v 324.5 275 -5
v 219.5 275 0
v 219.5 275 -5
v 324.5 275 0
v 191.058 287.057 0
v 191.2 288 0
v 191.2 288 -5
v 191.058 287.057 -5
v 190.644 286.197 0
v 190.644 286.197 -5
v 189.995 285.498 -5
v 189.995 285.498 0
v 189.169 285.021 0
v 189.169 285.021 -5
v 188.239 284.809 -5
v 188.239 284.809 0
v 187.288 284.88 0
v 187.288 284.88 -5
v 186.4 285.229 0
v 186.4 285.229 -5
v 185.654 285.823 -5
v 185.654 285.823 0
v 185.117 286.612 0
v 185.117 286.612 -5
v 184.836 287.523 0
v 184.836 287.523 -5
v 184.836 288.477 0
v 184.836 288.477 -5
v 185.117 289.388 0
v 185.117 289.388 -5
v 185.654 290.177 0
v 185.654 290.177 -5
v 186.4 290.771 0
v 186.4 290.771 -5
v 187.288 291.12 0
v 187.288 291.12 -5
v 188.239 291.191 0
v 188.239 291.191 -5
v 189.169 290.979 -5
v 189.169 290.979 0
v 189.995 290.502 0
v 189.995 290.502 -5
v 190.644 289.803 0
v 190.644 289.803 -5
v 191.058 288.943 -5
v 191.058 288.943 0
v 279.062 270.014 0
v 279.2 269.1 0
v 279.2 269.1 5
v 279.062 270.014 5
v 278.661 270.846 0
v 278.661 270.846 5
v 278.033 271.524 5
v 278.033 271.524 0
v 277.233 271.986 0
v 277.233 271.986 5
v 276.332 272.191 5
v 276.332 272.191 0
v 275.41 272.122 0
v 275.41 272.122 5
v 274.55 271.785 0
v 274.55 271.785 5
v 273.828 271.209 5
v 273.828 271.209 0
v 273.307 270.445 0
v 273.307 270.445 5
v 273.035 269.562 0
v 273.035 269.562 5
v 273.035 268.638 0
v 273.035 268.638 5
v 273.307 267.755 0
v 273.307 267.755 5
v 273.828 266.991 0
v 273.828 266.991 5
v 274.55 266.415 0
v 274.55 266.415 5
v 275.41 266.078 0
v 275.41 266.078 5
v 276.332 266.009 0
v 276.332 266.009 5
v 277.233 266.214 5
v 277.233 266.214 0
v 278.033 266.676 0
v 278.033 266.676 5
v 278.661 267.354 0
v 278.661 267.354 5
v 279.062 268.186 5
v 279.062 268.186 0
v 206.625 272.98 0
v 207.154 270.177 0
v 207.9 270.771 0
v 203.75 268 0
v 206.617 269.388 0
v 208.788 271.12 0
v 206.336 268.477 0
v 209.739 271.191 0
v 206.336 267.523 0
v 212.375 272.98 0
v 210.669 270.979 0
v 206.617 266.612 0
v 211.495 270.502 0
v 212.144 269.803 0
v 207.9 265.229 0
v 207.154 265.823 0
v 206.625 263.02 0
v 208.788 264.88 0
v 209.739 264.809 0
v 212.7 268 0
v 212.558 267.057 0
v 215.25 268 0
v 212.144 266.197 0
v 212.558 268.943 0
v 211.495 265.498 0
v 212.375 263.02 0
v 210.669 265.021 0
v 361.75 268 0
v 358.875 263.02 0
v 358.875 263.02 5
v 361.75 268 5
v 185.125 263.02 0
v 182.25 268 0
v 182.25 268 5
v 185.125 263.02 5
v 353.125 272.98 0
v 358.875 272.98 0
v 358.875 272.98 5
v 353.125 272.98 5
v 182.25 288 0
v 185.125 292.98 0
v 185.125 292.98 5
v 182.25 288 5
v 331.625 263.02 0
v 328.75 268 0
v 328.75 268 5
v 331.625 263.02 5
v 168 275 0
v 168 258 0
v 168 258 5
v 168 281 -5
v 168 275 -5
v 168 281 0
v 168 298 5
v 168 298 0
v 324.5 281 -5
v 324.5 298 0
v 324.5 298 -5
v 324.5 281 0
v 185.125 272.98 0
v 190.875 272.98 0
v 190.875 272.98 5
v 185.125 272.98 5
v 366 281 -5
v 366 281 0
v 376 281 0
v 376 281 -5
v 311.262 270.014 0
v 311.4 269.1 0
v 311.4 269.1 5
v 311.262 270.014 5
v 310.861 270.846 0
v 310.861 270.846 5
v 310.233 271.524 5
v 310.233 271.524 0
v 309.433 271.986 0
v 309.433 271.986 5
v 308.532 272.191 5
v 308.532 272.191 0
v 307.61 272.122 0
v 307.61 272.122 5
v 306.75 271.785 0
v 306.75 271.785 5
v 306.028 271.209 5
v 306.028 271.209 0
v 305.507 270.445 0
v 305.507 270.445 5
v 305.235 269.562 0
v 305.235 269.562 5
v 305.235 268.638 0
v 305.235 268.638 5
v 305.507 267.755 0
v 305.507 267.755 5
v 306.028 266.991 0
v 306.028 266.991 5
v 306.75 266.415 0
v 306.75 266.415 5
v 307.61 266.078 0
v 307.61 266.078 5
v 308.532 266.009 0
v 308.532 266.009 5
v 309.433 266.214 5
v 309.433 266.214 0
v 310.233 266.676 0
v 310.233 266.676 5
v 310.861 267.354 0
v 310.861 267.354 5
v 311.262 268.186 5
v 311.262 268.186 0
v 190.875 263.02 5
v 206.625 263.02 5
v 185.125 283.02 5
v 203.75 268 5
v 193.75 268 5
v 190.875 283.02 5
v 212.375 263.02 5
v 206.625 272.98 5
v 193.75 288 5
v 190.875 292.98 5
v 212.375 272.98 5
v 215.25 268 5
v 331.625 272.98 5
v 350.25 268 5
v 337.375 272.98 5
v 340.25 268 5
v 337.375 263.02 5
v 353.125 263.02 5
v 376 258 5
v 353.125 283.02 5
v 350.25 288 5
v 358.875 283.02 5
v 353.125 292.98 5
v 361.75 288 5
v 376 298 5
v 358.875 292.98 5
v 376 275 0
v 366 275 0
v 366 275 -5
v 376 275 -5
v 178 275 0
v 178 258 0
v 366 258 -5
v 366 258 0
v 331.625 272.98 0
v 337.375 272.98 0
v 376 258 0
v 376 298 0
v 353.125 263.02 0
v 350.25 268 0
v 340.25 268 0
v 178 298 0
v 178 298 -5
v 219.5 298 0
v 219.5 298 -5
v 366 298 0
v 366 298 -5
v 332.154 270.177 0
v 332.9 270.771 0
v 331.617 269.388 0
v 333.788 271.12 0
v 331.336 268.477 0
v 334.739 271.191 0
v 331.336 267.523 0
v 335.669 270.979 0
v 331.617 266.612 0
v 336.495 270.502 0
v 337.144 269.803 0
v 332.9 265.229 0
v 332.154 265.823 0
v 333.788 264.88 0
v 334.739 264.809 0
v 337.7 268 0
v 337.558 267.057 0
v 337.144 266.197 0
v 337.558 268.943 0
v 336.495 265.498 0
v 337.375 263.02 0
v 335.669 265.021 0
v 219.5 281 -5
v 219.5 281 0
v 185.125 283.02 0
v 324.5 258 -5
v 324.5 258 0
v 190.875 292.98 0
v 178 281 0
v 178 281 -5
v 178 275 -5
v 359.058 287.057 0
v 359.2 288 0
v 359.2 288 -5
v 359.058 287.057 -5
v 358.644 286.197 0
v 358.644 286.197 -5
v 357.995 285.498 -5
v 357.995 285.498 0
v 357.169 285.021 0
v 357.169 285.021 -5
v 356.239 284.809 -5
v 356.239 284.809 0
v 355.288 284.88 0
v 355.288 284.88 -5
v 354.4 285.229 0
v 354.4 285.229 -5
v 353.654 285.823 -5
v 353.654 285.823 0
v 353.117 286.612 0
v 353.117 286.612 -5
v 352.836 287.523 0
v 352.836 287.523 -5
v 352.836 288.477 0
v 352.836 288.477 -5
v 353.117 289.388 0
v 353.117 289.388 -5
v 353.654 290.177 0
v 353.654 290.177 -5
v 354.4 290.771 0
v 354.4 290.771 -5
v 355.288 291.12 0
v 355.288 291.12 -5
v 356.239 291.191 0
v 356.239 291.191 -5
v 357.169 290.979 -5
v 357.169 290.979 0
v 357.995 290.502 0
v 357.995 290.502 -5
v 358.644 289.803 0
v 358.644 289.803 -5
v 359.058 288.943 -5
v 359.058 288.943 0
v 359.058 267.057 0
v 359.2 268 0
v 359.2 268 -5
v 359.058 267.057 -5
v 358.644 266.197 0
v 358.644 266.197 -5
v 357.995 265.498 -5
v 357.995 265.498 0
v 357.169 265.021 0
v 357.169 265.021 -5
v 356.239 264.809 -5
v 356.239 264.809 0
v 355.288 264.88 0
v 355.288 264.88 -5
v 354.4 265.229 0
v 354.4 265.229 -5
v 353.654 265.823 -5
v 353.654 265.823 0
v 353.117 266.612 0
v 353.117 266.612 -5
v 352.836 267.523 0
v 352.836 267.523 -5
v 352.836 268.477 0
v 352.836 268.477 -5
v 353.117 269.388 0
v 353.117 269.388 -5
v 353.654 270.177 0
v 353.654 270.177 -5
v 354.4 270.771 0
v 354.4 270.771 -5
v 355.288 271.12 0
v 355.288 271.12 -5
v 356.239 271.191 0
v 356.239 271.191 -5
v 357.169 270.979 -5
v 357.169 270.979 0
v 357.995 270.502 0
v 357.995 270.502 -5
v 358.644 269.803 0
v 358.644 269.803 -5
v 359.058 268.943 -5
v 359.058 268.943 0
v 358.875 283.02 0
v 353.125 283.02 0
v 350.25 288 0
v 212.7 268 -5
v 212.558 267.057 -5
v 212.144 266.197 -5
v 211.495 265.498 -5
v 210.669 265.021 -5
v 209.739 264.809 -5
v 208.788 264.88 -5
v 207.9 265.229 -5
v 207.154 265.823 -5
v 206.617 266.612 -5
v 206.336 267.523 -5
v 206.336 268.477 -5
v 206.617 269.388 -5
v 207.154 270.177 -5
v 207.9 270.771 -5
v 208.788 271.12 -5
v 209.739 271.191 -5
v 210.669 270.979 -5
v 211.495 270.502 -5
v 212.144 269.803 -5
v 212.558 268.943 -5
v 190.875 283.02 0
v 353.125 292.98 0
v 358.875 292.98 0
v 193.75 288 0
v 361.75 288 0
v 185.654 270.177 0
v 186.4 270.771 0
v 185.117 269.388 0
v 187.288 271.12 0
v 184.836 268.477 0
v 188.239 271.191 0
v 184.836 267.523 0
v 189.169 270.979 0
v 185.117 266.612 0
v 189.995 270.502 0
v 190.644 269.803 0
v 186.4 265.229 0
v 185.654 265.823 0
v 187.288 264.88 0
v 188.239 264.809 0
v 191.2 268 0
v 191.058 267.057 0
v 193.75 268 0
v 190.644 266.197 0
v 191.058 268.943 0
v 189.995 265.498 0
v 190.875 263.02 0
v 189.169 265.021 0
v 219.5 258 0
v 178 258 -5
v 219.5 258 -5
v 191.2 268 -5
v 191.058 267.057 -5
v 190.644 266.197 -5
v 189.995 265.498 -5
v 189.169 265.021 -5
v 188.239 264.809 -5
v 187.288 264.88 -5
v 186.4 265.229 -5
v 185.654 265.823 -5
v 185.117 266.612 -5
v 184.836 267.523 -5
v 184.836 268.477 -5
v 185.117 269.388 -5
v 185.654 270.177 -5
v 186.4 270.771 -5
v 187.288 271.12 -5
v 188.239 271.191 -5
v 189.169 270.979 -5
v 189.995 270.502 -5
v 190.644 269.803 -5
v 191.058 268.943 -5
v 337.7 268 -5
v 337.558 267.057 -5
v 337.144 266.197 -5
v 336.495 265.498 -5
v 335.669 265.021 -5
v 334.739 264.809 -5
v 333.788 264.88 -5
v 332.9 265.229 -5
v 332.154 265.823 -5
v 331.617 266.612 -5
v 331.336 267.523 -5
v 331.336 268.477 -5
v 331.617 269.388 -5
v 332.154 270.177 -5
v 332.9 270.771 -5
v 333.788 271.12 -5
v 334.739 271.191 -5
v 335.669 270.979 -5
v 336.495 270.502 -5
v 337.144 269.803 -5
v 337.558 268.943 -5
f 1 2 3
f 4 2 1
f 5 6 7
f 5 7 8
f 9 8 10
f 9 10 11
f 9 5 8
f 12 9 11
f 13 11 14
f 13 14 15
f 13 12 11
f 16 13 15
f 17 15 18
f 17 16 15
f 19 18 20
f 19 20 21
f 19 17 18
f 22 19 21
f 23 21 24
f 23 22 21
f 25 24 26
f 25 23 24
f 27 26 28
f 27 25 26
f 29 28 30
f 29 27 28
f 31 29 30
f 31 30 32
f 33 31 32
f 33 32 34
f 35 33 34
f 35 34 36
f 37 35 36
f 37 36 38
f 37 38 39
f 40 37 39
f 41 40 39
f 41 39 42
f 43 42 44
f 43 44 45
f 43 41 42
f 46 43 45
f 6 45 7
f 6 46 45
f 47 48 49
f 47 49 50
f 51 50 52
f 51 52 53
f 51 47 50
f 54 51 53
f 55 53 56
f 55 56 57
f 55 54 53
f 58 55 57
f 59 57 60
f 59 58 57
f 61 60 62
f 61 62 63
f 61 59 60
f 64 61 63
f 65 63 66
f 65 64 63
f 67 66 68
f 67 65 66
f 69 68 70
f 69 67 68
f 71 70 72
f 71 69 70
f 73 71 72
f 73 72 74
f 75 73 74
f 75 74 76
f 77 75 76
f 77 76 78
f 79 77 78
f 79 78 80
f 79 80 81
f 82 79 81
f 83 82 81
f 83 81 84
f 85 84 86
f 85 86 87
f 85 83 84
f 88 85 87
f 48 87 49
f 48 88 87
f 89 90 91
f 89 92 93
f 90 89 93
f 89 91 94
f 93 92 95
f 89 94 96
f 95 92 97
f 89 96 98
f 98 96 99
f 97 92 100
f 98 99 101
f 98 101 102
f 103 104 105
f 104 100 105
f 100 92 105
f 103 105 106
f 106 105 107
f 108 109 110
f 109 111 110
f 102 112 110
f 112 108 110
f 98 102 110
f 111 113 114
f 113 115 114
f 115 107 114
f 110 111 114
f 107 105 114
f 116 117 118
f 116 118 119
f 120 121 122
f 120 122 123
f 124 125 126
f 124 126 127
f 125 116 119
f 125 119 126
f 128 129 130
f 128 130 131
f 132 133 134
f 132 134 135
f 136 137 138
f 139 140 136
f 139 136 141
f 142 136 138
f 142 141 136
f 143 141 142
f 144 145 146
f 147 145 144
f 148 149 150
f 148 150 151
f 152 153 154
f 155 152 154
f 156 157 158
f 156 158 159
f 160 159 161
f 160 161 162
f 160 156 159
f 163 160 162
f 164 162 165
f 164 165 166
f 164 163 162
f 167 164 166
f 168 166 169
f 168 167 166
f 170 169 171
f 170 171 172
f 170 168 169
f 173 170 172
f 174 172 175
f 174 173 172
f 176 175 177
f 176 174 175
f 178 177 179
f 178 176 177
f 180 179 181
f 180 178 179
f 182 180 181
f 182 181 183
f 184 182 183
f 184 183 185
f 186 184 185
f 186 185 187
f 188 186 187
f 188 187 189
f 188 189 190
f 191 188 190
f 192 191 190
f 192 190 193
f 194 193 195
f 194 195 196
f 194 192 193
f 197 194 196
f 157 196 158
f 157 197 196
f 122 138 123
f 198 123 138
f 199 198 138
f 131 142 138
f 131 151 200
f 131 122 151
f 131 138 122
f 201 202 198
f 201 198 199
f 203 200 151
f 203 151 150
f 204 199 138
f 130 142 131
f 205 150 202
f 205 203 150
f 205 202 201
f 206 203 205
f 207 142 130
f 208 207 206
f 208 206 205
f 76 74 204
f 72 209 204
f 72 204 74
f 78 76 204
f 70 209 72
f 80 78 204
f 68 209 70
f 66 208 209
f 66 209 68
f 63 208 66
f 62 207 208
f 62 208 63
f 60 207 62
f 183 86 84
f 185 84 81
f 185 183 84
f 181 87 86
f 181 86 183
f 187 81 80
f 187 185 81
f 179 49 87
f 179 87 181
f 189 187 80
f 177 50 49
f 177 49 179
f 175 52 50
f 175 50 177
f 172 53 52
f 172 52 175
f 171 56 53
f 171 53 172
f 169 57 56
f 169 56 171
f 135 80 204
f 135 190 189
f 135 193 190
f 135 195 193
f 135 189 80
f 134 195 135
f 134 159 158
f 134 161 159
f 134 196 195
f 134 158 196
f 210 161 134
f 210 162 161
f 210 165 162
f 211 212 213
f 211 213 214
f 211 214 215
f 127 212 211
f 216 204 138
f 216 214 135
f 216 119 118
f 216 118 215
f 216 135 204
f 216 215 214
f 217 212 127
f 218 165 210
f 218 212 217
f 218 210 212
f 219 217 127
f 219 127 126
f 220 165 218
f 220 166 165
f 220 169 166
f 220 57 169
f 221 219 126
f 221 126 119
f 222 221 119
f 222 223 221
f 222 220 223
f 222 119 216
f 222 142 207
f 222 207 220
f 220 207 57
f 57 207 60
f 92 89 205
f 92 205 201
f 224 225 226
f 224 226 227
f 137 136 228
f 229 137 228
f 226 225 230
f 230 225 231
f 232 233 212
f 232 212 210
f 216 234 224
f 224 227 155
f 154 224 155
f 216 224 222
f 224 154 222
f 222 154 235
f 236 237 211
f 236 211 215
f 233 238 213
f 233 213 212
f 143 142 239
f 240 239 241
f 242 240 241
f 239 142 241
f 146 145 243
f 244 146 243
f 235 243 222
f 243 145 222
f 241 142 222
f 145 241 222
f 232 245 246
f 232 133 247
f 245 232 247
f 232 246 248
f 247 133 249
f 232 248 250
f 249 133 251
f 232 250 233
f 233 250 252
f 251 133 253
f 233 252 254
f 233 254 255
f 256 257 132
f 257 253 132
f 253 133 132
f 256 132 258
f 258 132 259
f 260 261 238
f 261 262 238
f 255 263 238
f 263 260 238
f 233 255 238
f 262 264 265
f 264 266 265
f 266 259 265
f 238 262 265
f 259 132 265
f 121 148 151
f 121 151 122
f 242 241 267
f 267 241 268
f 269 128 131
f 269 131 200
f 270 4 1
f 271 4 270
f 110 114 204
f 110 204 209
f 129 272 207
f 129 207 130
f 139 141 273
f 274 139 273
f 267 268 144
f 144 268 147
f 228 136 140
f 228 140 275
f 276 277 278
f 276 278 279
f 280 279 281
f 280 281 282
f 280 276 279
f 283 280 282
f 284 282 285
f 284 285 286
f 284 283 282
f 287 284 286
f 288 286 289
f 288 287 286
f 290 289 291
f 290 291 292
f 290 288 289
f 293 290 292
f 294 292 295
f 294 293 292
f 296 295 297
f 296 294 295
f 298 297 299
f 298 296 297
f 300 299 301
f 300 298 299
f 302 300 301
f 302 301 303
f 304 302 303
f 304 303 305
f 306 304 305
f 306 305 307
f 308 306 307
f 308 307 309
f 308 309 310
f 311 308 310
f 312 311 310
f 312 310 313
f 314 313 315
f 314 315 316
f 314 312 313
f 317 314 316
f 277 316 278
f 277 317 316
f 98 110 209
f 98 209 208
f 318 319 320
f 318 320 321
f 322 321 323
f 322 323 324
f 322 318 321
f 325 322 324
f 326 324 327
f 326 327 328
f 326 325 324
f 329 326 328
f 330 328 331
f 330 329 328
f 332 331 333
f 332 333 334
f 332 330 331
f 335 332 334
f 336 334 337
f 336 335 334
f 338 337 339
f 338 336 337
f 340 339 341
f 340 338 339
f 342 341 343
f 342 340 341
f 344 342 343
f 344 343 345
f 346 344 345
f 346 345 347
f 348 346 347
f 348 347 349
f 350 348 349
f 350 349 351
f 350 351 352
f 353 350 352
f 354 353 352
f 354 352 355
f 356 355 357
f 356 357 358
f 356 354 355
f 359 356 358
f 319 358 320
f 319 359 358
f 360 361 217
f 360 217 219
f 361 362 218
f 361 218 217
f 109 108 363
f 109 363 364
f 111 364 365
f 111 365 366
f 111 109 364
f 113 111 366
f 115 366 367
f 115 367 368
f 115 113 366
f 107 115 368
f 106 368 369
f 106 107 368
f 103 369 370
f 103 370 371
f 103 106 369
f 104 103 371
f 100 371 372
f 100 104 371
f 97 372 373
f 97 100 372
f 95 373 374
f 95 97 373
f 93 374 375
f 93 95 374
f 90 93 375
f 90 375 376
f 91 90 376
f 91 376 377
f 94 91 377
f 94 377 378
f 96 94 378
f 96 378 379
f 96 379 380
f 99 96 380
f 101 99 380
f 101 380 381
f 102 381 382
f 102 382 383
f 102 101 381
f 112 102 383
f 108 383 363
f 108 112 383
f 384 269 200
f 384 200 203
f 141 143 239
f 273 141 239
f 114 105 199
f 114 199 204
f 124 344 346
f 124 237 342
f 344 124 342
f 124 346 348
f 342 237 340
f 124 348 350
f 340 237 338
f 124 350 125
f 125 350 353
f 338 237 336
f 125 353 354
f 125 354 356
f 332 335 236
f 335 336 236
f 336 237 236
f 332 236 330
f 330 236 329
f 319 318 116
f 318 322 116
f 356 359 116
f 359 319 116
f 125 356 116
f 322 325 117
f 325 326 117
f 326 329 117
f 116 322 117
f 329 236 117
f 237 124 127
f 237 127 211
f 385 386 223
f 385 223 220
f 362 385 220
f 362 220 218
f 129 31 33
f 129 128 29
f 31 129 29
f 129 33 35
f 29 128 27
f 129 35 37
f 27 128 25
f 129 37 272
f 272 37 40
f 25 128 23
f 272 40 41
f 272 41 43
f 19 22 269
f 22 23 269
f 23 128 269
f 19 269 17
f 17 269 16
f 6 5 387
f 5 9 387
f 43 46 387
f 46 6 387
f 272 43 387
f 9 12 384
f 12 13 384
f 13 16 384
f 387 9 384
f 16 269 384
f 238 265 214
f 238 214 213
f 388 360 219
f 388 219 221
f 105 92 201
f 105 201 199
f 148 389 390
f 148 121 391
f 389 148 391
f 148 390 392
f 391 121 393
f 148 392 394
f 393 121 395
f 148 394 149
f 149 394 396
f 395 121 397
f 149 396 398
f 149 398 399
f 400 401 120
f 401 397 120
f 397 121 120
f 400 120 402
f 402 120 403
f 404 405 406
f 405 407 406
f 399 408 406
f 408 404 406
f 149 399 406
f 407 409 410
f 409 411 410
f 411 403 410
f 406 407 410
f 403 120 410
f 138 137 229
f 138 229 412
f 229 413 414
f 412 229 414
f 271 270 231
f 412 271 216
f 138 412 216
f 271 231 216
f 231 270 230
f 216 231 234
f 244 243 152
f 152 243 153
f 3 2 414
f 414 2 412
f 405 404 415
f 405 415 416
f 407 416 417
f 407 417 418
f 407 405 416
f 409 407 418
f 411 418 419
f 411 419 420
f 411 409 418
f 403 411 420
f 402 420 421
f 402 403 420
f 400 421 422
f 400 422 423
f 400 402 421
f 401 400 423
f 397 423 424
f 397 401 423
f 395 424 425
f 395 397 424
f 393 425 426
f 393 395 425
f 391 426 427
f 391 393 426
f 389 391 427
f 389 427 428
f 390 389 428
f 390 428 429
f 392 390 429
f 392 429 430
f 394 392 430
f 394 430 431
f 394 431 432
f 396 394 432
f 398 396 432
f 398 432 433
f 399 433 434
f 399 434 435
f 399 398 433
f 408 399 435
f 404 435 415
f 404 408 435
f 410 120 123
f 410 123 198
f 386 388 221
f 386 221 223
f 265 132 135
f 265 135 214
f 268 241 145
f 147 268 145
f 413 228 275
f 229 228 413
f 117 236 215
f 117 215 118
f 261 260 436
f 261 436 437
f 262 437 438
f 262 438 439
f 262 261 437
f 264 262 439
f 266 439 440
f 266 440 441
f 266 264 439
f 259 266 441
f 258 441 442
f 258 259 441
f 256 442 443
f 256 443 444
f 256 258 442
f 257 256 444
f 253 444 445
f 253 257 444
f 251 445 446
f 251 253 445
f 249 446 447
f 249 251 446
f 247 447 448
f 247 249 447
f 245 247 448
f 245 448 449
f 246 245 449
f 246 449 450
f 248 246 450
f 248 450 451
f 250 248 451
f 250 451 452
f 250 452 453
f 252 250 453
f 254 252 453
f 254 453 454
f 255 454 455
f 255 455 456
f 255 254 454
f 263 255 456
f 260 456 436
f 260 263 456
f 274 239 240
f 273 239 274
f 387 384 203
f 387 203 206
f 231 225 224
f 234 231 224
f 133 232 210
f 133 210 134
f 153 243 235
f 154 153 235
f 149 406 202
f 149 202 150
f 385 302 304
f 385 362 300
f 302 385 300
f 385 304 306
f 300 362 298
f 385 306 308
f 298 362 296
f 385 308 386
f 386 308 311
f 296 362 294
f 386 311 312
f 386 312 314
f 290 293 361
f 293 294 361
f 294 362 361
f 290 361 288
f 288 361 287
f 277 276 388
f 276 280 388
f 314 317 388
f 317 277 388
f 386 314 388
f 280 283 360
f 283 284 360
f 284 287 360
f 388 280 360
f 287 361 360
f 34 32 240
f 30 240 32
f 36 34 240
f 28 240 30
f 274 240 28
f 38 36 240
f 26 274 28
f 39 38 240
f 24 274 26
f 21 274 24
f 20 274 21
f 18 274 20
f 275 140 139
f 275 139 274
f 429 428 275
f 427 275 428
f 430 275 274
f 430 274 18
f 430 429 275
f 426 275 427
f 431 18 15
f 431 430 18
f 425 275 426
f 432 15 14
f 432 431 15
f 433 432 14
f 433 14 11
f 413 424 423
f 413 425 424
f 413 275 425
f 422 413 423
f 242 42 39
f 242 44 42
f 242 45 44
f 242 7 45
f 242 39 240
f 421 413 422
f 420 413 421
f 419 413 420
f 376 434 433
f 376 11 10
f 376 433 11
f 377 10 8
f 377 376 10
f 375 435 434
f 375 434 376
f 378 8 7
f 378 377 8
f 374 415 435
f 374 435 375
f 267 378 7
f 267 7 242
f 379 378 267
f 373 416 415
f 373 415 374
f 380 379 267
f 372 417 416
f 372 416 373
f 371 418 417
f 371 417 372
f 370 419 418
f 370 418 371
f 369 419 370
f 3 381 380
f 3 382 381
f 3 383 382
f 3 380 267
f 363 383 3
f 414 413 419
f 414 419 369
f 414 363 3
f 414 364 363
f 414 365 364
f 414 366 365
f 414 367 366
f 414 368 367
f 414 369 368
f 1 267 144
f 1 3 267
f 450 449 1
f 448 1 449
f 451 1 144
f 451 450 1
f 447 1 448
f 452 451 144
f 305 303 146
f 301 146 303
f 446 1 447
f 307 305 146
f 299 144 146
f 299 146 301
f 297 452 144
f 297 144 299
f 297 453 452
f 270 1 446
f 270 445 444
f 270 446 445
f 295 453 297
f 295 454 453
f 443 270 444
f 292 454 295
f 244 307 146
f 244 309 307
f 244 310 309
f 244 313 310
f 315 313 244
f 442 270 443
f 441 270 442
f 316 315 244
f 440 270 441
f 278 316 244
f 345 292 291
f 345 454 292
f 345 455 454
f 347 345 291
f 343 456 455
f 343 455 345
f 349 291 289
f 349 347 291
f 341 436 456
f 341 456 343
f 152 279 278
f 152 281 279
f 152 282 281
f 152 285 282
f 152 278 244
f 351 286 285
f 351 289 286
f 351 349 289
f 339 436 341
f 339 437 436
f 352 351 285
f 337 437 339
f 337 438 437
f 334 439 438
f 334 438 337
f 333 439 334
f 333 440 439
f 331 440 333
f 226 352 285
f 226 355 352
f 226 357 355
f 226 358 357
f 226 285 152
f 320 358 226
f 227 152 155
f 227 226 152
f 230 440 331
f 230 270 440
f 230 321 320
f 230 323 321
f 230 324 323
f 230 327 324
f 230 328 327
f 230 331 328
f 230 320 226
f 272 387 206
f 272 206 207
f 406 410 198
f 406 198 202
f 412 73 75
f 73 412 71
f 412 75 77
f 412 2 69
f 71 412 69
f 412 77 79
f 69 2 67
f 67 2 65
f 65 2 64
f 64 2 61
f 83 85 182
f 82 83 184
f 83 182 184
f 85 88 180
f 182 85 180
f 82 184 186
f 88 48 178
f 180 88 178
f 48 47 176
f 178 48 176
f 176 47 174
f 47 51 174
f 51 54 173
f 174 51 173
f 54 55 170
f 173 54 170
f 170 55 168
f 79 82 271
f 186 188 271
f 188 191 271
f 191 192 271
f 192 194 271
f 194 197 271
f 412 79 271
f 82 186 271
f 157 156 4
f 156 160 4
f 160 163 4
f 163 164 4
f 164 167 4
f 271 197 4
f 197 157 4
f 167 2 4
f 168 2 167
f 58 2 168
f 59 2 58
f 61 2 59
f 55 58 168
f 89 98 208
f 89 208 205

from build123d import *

# Parameters (mm, degrees)
SKETCH005_W  = 208
SKETCH005_H  = 40
SKETCH005_R  = 3.1
PAD005_DEPTH = 5
SKETCH006_W  = 208
SKETCH006_H  = 6
PAD006_DEPTH = 5
SKETCH007_W  = 41.5
SKETCH007_H  = 40
SKETCH007_R  = 3.2
PAD007_DEPTH = 5


with BuildPart() as part:
    # Sketch005 → Pad005 (new body)
    with BuildSketch(Plane.XY):
        with Locations((4, 0)):
            Rectangle(SKETCH005_W, SKETCH005_H)
        with Locations((8.1, -8.9)):
            Circle(SKETCH005_R, mode=Mode.SUBTRACT)
        with Locations((40.3, -8.9)):
            Circle(SKETCH005_R, mode=Mode.SUBTRACT)
        Polygon((93.75, 10), (90.875, 14.979646), (85.125, 14.979646), (82.25, 10), (85.125, 5.020354), (90.875, 5.020354), align=None, mode=Mode.SUBTRACT)
        Polygon((93.75, -10), (90.875, -5.020354), (85.125, -5.020354), (82.25, -10), (85.125, -14.979646), (90.875, -14.979646), align=None, mode=Mode.SUBTRACT)
        Polygon((-74.25, 10), (-77.125, 14.979646), (-82.875, 14.979646), (-85.75, 10), (-82.875, 5.020354), (-77.125, 5.020354), align=None, mode=Mode.SUBTRACT)
        Polygon((-74.25, -10), (-77.125, -5.020354), (-82.875, -5.020354), (-85.75, -10), (-82.875, -14.979646), (-77.125, -14.979646), align=None, mode=Mode.SUBTRACT)
        Polygon((-52.75, -10), (-55.625, -5.020354), (-61.375, -5.020354), (-64.25, -10), (-61.375, -14.979646), (-55.625, -14.979646), align=None, mode=Mode.SUBTRACT)
        Polygon((72.25, -10), (69.375, -5.020354), (63.625, -5.020354), (60.75, -10), (63.625, -14.979646), (69.375, -14.979646), align=None, mode=Mode.SUBTRACT)
    extrude(amount=PAD005_DEPTH)

    # Sketch006 (on Face43 of Pad005) → Pad006 (join)
    with BuildSketch(Plane(origin=(0, 0, 0), x_dir=(1, 0, 0), z_dir=(0, 0, -1))):
        with Locations((4, 0)):
            Rectangle(SKETCH006_W, SKETCH006_H)
    extrude(amount=PAD006_DEPTH)

    # Sketch007 (on Face6 of Pad006) → Pad007 (join)
    with BuildSketch(Plane(origin=(0, 0, 0), x_dir=(1, 0, 0), z_dir=(0, 0, -1))):
        with Locations((77.25, 0)):
            Rectangle(SKETCH007_W, SKETCH007_H)
        with Locations((88, 10)):
            Circle(SKETCH007_R, mode=Mode.SUBTRACT)
        with Locations((88, -10)):
            Circle(SKETCH007_R, mode=Mode.SUBTRACT)
        with Locations((66.5, 10)):
            Circle(SKETCH007_R, mode=Mode.SUBTRACT)
        with Locations((-69.25, 0)):
            Rectangle(SKETCH007_W, SKETCH007_H)
        with Locations((-58.5, 10)):
            Circle(SKETCH007_R, mode=Mode.SUBTRACT)
        with Locations((-80, -10)):
            Circle(SKETCH007_R, mode=Mode.SUBTRACT)
        with Locations((-80, 10)):
            Circle(SKETCH007_R, mode=Mode.SUBTRACT)
    extrude(amount=PAD007_DEPTH)


with BuildPart() as part_1:
    # Body007 placement: moved
    add(part.part.moved(Location((268, 278, 0))))


solid = part_1.part
